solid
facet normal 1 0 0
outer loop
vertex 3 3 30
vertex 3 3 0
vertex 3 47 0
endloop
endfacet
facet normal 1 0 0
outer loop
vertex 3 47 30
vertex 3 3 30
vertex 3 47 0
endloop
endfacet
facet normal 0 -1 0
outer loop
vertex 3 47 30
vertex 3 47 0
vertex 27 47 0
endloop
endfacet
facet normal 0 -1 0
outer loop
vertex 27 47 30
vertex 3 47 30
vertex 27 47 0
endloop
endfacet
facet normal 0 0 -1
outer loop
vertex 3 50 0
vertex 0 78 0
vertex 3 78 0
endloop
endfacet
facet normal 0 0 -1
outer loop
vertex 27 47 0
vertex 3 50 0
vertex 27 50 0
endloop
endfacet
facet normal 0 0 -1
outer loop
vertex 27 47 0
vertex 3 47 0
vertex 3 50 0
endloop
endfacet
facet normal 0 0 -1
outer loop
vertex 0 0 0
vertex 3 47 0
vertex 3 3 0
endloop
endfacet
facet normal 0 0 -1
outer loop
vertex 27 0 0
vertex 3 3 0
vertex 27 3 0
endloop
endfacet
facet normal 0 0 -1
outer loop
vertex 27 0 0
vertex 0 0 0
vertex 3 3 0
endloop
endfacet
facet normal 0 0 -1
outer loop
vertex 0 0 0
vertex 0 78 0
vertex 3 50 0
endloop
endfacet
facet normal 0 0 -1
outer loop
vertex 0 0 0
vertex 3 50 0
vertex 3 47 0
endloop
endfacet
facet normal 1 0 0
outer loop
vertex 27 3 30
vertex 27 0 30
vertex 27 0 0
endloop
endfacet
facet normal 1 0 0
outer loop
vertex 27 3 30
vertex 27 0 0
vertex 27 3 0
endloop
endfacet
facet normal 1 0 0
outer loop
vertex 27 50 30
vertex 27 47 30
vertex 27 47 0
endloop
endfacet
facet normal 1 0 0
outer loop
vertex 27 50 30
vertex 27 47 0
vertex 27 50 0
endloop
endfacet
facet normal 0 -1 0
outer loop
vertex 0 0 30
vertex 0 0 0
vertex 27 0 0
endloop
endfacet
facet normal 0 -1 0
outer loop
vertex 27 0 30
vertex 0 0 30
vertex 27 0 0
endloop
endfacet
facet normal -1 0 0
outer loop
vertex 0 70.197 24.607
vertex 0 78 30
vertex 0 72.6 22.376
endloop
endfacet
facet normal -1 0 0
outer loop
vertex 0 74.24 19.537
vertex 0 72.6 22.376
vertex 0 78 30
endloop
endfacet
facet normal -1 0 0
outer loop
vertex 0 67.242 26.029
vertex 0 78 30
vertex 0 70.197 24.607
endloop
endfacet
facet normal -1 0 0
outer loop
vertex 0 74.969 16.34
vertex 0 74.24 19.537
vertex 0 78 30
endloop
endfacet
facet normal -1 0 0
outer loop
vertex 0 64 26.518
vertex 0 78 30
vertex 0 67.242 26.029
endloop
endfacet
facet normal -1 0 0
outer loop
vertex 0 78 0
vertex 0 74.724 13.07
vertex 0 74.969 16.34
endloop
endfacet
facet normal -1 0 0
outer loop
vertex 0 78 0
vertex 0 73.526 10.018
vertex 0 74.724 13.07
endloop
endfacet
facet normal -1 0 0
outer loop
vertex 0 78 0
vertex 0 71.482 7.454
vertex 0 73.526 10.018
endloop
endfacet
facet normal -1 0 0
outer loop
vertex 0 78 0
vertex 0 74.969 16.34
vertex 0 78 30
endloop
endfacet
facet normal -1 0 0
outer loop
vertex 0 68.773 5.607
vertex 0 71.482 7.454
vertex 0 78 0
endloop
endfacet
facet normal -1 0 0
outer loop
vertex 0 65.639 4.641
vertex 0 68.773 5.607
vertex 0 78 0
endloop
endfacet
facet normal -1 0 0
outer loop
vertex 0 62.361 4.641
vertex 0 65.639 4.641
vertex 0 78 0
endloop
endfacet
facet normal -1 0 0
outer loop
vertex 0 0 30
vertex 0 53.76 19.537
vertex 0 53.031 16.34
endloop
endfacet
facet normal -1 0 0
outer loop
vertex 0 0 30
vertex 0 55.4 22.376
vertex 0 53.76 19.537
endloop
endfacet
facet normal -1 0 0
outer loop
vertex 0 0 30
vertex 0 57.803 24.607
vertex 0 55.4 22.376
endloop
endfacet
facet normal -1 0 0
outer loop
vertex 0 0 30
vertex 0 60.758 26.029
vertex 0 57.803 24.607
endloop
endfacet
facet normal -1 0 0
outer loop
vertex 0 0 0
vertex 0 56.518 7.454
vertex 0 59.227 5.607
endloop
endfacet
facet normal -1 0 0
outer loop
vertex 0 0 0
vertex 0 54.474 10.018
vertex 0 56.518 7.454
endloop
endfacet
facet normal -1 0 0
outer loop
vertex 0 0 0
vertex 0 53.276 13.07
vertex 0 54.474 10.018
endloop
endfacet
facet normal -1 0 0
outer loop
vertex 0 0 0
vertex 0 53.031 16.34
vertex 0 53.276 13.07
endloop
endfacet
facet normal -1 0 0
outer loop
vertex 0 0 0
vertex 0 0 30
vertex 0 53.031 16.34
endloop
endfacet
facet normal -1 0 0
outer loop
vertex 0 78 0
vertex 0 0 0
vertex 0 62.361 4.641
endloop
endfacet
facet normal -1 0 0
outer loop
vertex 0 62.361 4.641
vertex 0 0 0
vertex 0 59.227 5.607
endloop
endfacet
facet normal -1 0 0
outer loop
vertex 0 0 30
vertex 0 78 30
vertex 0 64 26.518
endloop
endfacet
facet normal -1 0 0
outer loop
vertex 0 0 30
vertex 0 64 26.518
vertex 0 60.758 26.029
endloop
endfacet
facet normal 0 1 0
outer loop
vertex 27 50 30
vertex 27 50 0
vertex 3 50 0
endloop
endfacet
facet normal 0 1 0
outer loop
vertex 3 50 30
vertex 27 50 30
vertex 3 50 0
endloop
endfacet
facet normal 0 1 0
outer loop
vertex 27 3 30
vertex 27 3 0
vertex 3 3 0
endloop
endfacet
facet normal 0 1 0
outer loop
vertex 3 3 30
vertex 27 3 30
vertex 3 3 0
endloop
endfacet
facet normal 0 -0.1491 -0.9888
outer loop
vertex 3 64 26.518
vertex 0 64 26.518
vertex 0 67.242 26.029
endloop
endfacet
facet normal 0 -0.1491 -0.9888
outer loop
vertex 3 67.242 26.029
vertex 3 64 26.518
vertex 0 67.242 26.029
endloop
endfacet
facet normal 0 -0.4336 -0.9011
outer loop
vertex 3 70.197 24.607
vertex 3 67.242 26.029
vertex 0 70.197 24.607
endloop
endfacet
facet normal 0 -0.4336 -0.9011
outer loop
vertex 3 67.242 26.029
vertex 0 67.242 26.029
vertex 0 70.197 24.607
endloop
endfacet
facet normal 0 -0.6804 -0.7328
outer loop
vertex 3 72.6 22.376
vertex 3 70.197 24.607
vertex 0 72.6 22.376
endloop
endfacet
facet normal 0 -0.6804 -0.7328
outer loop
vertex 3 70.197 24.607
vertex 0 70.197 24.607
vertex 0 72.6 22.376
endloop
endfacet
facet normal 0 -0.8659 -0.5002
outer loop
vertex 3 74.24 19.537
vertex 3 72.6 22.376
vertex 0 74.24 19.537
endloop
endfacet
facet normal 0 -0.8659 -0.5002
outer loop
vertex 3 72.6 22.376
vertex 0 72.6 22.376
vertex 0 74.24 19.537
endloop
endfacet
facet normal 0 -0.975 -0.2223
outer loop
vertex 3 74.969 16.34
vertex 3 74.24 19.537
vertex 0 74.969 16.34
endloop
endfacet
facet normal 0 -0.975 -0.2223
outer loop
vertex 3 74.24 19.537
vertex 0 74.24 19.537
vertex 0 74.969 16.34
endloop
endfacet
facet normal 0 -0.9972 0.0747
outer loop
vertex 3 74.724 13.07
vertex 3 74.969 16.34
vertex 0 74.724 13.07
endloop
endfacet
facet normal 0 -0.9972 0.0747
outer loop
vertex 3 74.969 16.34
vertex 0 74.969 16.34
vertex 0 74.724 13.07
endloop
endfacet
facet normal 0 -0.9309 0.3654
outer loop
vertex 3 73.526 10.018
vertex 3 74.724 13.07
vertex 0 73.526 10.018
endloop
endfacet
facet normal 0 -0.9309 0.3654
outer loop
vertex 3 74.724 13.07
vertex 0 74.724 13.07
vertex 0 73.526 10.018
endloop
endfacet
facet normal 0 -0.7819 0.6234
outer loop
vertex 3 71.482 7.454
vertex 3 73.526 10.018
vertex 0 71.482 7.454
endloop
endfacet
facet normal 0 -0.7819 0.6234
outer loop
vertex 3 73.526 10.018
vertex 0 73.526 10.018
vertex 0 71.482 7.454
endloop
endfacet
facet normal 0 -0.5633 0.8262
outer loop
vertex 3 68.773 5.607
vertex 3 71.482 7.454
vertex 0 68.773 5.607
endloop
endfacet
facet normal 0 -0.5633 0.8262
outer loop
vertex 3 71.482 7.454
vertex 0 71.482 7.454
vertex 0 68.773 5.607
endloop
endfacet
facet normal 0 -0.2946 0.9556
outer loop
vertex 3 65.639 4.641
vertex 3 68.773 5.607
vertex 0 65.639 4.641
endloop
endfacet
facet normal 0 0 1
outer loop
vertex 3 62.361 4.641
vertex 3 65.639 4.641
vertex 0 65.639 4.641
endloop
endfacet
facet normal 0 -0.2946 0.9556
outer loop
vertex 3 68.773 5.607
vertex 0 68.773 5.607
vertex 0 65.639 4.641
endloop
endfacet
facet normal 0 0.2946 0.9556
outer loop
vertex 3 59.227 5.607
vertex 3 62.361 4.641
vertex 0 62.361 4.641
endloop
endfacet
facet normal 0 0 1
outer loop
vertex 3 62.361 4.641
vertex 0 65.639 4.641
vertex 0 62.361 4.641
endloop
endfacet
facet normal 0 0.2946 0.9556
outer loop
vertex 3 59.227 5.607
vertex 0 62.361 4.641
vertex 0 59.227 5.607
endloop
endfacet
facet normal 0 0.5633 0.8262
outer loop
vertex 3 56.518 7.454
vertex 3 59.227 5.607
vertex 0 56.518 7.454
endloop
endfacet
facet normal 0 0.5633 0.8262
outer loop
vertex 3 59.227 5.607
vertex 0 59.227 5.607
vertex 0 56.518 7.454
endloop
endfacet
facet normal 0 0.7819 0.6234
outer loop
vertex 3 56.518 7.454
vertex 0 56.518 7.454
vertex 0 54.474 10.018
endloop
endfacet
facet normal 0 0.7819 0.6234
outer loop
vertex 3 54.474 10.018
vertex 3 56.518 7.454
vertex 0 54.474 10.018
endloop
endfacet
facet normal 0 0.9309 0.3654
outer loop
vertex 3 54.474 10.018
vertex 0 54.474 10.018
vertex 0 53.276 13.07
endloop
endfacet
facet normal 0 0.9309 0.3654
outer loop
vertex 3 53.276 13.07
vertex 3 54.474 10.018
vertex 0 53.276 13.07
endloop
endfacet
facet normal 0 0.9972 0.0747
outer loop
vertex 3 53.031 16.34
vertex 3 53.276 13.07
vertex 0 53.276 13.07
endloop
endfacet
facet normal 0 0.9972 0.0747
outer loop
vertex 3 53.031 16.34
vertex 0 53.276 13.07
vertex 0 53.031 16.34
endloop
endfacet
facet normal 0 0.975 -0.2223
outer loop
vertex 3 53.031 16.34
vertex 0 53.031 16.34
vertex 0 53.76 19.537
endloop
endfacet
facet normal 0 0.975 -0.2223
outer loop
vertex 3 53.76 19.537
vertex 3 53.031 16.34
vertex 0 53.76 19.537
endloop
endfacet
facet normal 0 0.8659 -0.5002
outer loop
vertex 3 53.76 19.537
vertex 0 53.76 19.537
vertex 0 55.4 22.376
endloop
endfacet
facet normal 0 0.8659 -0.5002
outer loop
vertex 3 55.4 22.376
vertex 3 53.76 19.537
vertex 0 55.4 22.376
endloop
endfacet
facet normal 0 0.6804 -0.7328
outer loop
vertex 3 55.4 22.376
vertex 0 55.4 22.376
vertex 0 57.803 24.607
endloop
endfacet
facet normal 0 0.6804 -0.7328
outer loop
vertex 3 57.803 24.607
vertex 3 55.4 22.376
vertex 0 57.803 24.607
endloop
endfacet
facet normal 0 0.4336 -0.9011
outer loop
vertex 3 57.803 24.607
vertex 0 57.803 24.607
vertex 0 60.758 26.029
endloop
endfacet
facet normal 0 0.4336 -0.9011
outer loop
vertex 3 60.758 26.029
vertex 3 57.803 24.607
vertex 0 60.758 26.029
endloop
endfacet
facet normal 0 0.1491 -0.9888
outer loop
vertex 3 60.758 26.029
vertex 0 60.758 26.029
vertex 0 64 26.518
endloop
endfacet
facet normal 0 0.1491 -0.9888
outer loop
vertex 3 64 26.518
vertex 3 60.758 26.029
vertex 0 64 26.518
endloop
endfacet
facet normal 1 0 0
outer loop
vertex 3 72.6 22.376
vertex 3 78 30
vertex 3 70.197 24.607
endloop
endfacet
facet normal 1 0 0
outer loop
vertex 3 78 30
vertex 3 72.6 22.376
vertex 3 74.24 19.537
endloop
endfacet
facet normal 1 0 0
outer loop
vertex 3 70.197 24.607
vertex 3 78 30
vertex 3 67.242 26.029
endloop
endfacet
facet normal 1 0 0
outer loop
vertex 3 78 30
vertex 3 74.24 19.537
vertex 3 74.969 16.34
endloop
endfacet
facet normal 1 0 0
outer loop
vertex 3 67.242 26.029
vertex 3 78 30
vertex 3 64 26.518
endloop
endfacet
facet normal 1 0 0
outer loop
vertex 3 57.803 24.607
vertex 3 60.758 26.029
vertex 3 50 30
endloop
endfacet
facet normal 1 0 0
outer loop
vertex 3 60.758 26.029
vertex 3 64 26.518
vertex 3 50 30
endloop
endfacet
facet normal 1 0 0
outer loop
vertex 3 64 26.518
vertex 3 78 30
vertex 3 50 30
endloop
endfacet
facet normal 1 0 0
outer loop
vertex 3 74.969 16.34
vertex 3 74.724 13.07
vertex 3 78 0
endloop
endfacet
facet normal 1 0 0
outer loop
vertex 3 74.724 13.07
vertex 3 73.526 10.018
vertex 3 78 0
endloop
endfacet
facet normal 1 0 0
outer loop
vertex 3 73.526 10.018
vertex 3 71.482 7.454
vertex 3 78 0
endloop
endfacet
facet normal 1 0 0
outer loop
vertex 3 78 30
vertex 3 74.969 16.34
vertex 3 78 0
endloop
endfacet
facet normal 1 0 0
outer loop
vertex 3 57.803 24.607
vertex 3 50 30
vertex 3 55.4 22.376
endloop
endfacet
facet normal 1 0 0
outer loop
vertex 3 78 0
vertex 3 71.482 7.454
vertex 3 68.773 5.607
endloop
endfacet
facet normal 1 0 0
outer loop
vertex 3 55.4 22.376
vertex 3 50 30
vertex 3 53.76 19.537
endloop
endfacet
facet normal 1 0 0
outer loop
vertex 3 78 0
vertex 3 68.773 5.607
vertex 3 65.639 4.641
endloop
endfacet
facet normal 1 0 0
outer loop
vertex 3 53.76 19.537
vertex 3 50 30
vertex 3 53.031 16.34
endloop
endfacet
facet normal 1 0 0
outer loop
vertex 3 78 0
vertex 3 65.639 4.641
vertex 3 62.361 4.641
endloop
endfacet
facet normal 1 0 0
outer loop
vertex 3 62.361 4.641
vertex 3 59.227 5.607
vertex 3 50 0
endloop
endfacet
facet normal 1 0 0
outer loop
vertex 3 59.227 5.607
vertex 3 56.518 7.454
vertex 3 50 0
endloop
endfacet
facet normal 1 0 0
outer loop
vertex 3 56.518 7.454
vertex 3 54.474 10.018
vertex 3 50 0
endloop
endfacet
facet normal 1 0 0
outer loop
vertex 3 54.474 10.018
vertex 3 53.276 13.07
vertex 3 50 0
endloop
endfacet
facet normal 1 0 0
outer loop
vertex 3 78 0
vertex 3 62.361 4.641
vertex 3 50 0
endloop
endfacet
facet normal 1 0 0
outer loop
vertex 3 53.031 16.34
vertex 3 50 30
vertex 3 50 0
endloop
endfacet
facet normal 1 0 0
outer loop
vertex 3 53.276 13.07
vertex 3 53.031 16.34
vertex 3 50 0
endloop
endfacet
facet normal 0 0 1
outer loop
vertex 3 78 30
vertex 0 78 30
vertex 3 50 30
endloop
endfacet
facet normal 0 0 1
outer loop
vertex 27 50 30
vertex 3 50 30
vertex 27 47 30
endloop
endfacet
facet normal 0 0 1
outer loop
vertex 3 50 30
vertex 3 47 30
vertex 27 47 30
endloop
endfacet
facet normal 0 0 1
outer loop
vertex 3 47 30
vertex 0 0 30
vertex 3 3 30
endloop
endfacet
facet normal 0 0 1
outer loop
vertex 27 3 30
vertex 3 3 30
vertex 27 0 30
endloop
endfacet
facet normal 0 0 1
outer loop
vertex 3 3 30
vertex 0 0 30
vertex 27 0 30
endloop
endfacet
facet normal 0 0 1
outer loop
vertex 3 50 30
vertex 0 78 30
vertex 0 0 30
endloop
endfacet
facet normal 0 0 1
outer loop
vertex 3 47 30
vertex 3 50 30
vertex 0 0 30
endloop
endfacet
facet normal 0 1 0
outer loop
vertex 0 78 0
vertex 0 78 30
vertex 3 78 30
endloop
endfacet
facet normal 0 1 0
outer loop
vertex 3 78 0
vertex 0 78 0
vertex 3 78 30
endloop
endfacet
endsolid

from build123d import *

# Parameters (mm, degrees)
EXTRUDE_1_DEPTH     = 30
SKETCH_2_W          = 3
SKETCH_2_H          = 30
EXTRUDE_2_DEPTH     = 28
CUT_EXTRUDE_1_REACH = 89.824
SKETCH_3_R          = 11


with BuildPart() as part:
    # 草图1 → 凸台-拉伸1 (new body)
    with BuildSketch(Plane.XY):
        Polygon((27, 47), (27, 50), (0, 50), (0, 0), (27, 0), (27, 3), (3, 3), (3, 47), align=None)
    extrude(amount=EXTRUDE_1_DEPTH)

    # 草图2 → 凸台-拉伸2 (add)
    with BuildSketch(Plane(origin=(0, 50, 0), x_dir=(1, 0, 0), z_dir=(0, 1, 0))):
        with Locations((1.5, -15)):
            Rectangle(SKETCH_2_W, SKETCH_2_H)
    extrude(amount=EXTRUDE_2_DEPTH)

    # 草图3 → 切除-拉伸1 (cut, up to next)
    with BuildSketch(Plane.ZY, mode=Mode.PRIVATE) as cut_extrude_1_sk1:
        with Locations((15.518002159, 64)):
            Circle(SKETCH_3_R)
    cut_extrude_1_tool1 = extrude(cut_extrude_1_sk1.sketch, amount=-CUT_EXTRUDE_1_REACH, mode=Mode.PRIVATE) & part.part
    add(cut_extrude_1_tool1.solids().sort_by_distance((0, 64, 15.518002))[0], mode=Mode.SUBTRACT)


solid = part.part
